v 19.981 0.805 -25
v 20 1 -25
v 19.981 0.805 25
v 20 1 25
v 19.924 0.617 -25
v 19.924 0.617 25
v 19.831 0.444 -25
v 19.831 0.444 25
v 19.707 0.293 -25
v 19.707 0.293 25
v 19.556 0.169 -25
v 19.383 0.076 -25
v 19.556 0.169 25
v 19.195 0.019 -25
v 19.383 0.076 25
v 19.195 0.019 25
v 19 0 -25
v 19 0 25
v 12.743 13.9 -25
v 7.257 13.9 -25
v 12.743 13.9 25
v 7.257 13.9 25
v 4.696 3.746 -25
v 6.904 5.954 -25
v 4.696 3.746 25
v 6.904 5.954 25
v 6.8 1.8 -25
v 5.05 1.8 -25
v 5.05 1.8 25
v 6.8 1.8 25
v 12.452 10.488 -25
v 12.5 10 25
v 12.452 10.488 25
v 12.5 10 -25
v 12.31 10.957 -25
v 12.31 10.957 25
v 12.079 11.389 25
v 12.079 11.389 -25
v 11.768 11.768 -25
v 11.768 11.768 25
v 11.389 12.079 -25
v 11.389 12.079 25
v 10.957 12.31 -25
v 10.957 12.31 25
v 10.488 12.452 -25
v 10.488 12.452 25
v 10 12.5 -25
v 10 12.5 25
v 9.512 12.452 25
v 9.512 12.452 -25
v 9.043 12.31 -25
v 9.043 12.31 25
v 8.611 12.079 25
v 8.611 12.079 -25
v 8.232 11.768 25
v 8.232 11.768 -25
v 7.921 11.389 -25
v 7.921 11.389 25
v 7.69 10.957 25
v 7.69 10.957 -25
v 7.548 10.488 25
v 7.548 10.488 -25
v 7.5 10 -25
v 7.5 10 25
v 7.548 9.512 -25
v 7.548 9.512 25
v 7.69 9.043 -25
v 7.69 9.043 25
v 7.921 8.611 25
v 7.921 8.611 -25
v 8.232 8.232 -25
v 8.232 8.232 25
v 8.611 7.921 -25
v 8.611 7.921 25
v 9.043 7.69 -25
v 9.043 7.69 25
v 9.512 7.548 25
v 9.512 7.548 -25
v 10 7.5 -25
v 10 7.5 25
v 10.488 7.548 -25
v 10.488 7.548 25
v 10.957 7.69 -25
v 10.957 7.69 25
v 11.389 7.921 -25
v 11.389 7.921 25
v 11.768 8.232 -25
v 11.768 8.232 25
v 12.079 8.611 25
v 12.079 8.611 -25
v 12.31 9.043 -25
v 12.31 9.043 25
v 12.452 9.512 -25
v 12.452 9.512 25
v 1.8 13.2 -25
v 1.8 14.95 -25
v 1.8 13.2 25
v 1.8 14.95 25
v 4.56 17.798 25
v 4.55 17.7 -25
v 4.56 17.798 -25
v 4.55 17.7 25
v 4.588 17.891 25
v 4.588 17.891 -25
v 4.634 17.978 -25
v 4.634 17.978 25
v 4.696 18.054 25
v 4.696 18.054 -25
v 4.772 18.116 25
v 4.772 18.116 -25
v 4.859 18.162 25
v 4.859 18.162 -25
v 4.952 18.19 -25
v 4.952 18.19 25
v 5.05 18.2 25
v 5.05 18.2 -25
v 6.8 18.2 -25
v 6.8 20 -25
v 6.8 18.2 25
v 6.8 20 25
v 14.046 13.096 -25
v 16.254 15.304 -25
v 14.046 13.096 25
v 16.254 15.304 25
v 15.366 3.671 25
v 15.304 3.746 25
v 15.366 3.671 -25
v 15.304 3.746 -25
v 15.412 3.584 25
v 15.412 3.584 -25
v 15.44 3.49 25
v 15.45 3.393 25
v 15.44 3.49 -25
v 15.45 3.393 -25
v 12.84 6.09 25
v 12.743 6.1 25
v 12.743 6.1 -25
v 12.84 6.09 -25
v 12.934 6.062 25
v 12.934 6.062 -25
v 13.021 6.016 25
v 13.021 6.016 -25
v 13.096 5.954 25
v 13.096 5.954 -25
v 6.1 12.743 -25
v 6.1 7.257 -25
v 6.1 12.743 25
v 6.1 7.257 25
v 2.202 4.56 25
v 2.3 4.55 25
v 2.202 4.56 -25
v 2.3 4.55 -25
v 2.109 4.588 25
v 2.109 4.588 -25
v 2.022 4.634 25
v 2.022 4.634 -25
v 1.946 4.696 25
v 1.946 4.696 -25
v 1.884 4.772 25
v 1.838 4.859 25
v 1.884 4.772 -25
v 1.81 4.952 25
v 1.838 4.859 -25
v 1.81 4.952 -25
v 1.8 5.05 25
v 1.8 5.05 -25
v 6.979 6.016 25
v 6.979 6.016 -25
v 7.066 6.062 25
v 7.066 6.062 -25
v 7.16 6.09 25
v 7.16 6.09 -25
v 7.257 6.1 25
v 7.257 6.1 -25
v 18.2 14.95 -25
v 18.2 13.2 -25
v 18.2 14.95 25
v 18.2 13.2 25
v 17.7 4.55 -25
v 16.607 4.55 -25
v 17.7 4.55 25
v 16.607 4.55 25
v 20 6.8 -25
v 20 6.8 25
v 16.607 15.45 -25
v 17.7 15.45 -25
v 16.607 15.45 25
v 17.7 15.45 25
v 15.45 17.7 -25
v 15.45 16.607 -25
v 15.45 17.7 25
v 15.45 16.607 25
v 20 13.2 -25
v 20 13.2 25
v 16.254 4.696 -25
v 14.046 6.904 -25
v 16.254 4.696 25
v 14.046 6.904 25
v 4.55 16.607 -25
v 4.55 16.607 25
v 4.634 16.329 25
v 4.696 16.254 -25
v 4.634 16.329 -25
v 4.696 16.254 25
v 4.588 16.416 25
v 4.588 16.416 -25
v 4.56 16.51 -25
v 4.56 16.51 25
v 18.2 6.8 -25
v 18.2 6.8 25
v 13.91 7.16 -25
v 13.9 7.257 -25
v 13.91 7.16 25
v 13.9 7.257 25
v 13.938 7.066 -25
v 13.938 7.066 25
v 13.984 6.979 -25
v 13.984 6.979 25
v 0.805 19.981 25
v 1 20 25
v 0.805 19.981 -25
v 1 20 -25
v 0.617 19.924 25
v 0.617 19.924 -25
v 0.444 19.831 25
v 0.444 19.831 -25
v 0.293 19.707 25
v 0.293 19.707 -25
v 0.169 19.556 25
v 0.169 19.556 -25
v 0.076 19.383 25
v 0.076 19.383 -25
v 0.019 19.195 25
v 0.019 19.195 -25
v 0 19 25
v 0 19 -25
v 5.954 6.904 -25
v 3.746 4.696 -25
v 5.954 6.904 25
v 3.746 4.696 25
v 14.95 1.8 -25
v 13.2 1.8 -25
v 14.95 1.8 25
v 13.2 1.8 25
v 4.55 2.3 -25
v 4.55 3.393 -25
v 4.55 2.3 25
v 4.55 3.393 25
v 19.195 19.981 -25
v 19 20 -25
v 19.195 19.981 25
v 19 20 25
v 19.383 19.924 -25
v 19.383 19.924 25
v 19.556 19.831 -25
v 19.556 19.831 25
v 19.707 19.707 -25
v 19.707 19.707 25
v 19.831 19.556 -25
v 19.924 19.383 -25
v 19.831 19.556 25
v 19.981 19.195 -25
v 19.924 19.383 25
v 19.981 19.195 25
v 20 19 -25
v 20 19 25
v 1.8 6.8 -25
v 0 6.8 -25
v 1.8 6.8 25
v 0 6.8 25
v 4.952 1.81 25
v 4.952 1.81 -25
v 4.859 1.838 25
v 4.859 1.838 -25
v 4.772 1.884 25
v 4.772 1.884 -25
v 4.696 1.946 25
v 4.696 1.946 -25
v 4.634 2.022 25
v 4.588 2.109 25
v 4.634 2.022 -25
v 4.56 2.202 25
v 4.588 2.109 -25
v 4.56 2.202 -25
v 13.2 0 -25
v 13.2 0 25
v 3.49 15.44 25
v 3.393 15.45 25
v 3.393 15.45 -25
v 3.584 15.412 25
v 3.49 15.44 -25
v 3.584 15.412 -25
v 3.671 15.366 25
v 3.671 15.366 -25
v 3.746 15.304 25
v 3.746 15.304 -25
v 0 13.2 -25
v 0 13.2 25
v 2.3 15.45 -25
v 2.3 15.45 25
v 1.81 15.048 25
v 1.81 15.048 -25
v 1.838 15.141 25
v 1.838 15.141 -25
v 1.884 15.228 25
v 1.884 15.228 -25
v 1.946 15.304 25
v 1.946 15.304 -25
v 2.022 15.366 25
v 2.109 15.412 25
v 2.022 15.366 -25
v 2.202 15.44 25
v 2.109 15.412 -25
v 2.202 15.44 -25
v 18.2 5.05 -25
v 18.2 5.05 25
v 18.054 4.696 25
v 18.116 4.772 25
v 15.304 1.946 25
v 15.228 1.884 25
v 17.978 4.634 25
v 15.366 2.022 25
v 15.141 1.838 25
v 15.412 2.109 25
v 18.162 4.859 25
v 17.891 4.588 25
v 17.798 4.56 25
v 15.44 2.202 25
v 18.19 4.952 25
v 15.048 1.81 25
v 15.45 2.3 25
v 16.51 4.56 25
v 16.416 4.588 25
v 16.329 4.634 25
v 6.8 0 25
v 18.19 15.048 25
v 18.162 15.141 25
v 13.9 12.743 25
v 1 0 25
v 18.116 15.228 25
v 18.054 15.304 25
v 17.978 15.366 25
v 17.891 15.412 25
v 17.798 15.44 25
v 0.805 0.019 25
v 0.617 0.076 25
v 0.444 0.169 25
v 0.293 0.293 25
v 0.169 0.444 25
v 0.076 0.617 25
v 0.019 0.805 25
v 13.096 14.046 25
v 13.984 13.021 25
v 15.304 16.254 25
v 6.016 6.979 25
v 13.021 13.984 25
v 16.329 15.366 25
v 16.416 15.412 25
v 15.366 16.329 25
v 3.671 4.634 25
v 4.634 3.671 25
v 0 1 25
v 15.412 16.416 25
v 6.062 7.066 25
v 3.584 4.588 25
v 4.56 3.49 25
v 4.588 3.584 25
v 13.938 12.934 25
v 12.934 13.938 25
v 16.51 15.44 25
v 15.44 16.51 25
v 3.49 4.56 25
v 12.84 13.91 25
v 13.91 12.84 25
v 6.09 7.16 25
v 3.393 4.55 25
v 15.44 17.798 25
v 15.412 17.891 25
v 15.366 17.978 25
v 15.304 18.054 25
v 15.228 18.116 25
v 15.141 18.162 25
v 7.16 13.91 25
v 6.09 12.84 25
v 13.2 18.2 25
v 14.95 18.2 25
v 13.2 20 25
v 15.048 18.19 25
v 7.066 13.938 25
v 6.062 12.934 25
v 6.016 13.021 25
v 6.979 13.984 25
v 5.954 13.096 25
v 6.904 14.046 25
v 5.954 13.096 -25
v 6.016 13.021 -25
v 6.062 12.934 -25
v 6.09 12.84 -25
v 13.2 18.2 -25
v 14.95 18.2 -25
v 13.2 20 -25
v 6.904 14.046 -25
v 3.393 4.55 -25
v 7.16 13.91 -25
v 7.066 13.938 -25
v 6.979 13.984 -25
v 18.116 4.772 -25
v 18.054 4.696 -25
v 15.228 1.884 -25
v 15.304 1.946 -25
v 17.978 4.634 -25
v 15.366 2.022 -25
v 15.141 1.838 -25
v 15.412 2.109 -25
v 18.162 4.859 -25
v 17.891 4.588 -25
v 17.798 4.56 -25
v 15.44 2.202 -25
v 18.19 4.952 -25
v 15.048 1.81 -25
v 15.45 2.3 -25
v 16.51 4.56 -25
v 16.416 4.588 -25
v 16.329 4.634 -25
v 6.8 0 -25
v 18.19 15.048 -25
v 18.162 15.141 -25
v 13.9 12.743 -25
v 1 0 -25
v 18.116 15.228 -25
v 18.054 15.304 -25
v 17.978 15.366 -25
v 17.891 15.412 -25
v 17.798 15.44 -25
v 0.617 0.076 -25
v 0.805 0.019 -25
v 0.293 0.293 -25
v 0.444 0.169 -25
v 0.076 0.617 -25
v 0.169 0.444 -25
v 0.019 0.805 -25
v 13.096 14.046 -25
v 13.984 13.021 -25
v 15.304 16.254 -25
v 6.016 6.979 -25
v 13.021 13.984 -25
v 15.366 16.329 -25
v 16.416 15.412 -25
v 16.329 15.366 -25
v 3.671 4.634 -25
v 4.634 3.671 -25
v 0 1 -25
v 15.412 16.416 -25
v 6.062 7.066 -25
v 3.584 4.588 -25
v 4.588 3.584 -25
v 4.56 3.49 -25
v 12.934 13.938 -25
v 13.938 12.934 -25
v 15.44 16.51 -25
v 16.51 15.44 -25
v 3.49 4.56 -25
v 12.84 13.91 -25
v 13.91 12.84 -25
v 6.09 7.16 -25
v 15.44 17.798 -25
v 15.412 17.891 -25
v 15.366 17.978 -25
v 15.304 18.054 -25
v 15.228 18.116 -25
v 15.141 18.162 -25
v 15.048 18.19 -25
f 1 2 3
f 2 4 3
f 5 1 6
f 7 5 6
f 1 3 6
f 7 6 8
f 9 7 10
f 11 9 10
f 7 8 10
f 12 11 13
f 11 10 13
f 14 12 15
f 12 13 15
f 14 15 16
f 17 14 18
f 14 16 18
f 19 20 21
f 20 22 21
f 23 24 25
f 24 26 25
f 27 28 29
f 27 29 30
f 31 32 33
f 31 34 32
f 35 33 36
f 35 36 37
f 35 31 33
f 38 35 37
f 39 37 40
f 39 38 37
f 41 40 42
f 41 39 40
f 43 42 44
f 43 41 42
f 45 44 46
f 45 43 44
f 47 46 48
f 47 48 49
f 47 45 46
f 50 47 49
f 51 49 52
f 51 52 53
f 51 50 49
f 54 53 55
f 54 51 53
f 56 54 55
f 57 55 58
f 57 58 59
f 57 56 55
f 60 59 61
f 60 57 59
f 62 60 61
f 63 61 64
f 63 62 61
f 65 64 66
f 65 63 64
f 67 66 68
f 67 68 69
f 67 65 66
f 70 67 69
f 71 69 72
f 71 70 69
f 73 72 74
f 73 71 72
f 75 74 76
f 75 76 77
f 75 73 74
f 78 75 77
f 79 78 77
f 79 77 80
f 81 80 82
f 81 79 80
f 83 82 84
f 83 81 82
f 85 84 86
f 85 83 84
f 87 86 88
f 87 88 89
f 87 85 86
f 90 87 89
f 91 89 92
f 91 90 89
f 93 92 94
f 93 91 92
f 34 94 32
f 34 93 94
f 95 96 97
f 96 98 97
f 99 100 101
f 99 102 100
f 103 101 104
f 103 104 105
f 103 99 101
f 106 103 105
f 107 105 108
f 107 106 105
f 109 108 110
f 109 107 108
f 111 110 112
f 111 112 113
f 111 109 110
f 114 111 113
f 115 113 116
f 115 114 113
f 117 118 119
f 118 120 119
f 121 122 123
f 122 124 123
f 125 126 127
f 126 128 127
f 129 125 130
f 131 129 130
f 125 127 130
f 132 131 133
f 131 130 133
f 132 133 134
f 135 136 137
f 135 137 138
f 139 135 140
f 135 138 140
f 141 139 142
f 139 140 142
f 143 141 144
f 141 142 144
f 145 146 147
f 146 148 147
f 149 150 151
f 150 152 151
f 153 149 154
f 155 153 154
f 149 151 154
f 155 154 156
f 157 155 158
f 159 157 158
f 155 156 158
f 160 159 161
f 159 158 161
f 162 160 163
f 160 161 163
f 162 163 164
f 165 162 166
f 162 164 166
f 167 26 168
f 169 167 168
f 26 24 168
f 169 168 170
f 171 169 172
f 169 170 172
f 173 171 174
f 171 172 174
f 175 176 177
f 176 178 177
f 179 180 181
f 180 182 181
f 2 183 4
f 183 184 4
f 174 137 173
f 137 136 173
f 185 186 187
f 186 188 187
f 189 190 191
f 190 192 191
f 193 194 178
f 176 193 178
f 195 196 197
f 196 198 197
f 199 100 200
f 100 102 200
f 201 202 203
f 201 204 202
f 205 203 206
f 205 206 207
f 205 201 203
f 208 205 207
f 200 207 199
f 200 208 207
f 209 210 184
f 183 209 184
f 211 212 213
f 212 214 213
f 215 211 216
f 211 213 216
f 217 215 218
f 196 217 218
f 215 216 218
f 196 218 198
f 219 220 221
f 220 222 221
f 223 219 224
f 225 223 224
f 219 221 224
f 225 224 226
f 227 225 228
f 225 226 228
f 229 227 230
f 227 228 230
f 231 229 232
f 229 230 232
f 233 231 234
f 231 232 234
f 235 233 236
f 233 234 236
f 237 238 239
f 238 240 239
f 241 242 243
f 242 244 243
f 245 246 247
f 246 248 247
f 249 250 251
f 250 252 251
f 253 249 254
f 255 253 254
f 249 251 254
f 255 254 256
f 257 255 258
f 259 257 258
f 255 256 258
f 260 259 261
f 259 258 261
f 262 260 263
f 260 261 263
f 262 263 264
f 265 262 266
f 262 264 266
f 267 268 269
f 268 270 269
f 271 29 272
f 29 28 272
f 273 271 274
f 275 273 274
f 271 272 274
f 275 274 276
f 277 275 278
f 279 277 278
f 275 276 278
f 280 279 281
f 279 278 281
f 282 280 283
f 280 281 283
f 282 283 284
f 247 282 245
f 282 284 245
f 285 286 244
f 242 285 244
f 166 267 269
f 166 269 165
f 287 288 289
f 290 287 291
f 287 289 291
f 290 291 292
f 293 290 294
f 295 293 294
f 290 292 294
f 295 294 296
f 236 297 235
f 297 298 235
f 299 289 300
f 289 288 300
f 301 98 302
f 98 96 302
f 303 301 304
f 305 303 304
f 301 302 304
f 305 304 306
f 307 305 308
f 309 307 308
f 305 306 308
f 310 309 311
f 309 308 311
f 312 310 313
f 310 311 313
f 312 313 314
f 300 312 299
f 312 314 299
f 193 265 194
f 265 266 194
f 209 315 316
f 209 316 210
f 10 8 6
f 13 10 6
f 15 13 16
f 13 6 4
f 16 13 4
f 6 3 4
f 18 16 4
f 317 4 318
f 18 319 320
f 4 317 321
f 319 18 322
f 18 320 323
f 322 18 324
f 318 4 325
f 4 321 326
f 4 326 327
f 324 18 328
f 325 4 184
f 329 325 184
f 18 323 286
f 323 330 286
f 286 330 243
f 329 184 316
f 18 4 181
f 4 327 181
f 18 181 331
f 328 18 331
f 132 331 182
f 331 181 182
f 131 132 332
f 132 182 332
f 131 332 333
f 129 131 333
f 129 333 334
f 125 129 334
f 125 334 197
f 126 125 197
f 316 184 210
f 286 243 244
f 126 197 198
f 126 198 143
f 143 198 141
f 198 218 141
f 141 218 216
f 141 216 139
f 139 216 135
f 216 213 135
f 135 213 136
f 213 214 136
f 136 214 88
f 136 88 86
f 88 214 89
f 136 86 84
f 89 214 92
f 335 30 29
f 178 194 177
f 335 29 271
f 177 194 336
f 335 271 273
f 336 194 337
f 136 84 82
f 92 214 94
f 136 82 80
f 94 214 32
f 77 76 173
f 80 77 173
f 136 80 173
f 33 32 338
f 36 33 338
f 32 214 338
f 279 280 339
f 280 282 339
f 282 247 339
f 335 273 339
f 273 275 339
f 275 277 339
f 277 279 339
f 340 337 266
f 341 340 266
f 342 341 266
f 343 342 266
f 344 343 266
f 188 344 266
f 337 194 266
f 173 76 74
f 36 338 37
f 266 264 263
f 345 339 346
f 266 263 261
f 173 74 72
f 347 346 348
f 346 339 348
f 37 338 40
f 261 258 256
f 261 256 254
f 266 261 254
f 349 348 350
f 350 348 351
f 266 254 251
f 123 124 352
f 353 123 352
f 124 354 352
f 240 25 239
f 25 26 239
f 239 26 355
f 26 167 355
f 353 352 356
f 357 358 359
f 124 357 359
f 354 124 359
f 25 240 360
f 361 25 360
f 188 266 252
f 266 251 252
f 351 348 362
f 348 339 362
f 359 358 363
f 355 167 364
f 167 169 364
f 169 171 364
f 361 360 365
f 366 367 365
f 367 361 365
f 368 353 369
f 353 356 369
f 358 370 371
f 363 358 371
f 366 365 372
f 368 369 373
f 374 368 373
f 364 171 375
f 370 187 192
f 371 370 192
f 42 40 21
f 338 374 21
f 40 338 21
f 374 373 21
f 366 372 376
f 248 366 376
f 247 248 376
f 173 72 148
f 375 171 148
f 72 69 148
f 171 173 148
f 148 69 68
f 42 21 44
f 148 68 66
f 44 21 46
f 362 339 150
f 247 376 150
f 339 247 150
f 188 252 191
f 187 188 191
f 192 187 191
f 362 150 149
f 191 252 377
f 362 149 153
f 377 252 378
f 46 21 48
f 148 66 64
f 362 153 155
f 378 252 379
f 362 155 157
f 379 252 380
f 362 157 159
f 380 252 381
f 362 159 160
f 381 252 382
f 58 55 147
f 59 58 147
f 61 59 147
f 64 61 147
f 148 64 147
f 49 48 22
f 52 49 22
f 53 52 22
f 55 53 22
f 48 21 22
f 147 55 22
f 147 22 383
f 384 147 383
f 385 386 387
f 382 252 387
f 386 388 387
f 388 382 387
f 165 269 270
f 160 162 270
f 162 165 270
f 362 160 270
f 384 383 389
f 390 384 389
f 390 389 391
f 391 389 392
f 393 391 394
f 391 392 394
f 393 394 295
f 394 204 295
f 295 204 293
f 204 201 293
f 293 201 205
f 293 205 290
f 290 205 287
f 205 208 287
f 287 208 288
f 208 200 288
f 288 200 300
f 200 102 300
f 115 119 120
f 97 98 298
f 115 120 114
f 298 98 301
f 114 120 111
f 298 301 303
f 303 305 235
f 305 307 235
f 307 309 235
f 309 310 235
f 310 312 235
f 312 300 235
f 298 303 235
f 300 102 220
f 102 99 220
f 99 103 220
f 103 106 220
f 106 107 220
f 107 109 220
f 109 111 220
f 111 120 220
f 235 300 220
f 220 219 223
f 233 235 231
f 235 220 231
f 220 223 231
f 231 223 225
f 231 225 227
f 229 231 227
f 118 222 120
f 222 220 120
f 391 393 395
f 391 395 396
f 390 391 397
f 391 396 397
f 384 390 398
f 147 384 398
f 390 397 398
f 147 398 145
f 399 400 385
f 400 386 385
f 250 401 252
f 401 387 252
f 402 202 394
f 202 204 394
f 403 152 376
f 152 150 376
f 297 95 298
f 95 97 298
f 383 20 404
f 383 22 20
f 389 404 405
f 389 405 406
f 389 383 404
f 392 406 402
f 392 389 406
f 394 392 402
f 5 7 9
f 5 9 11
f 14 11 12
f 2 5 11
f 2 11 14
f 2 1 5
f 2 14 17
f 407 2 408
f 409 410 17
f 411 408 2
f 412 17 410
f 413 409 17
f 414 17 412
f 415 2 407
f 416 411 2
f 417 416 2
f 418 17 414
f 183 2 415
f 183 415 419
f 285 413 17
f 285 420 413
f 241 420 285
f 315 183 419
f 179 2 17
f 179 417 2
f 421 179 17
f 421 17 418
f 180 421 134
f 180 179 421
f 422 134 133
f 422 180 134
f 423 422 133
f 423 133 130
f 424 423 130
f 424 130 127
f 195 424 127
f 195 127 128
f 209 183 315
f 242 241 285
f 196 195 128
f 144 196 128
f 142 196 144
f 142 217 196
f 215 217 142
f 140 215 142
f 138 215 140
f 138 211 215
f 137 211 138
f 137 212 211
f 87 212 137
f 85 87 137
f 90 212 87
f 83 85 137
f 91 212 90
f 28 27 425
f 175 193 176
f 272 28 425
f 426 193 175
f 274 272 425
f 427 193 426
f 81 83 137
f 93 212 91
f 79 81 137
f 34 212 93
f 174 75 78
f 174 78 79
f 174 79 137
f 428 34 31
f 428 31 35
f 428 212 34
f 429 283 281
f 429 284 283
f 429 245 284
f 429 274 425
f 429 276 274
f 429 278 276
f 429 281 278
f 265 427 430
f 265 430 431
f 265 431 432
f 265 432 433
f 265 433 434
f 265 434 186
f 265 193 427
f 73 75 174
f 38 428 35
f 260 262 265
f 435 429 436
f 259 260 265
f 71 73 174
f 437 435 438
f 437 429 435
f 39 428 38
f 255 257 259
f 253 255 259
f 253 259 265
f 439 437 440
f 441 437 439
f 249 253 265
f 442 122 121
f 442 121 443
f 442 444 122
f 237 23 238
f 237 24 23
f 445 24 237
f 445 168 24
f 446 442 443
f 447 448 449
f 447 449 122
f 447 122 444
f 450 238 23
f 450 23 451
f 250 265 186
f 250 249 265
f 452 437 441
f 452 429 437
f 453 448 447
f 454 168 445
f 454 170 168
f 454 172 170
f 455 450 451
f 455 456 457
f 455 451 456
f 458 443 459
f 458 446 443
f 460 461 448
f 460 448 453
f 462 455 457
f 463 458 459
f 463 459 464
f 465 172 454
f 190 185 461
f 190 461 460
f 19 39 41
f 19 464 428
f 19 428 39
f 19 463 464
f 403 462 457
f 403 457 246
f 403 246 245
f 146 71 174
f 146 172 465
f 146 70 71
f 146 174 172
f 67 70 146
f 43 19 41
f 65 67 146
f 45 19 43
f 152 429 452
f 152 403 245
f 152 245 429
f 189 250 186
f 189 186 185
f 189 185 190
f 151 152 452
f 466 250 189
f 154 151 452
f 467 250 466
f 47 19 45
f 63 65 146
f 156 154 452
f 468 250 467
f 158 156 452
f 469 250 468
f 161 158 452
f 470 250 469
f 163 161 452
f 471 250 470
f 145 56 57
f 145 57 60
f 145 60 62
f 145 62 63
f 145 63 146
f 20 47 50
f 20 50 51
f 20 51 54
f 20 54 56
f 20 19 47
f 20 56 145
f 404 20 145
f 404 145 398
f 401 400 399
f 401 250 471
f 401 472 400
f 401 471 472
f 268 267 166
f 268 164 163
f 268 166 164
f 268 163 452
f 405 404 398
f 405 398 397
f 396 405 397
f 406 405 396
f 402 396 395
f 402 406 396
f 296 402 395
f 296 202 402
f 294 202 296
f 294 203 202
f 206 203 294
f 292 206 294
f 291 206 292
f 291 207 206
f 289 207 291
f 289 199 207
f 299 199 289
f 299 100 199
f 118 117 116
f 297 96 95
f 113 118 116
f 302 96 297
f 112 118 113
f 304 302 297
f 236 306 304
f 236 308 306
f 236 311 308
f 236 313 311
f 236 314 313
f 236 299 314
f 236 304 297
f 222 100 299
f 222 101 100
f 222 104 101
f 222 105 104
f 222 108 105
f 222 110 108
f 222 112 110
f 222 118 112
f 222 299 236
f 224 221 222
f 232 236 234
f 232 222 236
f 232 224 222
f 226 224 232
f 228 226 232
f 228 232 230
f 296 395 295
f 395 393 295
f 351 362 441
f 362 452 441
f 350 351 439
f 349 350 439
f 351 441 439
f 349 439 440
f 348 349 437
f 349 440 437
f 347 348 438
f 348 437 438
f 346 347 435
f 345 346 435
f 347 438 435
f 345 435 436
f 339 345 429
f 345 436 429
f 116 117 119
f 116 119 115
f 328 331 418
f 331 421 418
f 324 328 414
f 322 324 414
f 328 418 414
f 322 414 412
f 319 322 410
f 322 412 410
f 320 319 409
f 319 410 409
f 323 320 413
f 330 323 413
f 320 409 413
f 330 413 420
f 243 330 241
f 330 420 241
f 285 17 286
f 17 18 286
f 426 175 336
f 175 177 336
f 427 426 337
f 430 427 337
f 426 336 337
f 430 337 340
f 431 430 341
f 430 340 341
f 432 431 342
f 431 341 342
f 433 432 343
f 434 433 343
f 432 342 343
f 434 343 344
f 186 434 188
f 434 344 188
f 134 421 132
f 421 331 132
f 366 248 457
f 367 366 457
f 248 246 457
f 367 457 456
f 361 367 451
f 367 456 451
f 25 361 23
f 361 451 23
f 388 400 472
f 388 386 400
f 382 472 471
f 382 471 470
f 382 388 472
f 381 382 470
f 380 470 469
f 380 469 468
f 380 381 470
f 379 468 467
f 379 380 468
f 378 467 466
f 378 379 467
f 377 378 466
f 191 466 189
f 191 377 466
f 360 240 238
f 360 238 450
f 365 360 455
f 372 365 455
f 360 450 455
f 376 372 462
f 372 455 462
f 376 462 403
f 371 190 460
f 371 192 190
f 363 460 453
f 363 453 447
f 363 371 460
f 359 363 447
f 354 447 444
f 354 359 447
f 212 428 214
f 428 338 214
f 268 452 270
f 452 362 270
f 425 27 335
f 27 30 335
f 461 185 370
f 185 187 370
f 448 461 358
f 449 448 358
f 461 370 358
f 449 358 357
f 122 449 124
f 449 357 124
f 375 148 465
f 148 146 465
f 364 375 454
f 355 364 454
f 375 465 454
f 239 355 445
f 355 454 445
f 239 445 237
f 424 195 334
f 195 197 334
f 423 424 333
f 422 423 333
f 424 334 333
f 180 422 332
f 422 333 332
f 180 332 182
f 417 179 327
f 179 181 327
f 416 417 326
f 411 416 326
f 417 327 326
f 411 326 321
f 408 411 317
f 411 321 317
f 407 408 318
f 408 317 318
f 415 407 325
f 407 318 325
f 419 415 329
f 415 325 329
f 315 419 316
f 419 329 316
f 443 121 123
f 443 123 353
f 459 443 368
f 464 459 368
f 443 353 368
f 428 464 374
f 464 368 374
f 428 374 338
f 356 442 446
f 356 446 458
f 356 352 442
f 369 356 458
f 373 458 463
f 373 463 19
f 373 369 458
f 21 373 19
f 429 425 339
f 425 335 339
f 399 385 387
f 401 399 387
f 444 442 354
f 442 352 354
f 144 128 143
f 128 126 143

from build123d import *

# Parameters (mm, degrees)
SKETCH1_R           = 2.5
BOSS_EXTRUDE1_DEPTH = 25
FILLET1_R           = 1
FILLET2_R           = 0.5
FILLET3_R           = 0.5
FILLET4_R           = 0.5
FILLET5_R           = 0.5


with BuildPart() as part:
    # Sketch1 → Boss-Extrude1 (new, symmetric)
    with BuildSketch(Plane.XY):
        Polygon((13.2, 0), (13.2, 1.8), (15.45, 1.8), (15.45, 3.6), (12.95, 6.1), (7.05, 6.1), (4.55, 3.6), (4.55, 1.8), (6.8, 1.8), (6.8, 0), (0, 0), (0, 6.8), (1.8, 6.8), (1.8, 4.55), (3.6, 4.55), (6.1, 7.05), (6.1, 12.95), (3.6, 15.45), (1.8, 15.45), (1.8, 13.2), (0, 13.2), (0, 20), (6.8, 20), (6.8, 18.2), (4.55, 18.2), (4.55, 16.4), (7.05, 13.9), (12.95, 13.9), (15.45, 16.4), (15.45, 18.2), (13.2, 18.2), (13.2, 20), (20, 20), (20, 13.2), (18.2, 13.2), (18.2, 15.45), (16.4, 15.45), (13.9, 12.95), (13.9, 7.05), (16.4, 4.55), (18.2, 4.55), (18.2, 6.8), (20, 6.8), (20, 0), align=None)
        with Locations((10, 10)):
            Circle(SKETCH1_R, mode=Mode.SUBTRACT)
    extrude(amount=BOSS_EXTRUDE1_DEPTH, both=True)

    # Fillet1
    fillet1_edges = [part.edges().sort_by_distance(p)[0] for p in [
        (0, 0, 0),
        (0, 20, 0),
        (20, 20, 0),
        (20, 0, 0),
    ]]
    fillet(fillet1_edges, radius=FILLET1_R)

    # Fillet2
    fillet2_edges = [part.edges().sort_by_distance(p)[0] for p in [
        (4.55, 18.2, 0),
        (4.55, 16.4, 0),
        (7.05, 13.9, 0),
        (12.95, 13.9, 0),
        (15.45, 16.4, 0),
        (15.45, 18.2, 0),
    ]]
    fillet(fillet2_edges, radius=FILLET2_R)

    # Fillet3
    fillet3_edges = [part.edges().sort_by_distance(p)[0] for p in [
        (18.2, 15.45, 0),
        (16.4, 15.45, 0),
        (13.9, 12.95, 0),
        (13.9, 7.05, 0),
        (16.4, 4.55, 0),
        (18.2, 4.55, 0),
    ]]
    fillet(fillet3_edges, radius=FILLET3_R)

    # Fillet4
    fillet4_edges = [part.edges().sort_by_distance(p)[0] for p in [
        (1.8, 4.55, 0),
        (3.6, 4.55, 0),
        (6.1, 7.05, 0),
        (6.1, 12.95, 0),
        (3.6, 15.45, 0),
        (1.8, 15.45, 0),
    ]]
    fillet(fillet4_edges, radius=FILLET4_R)

    # Fillet5
    fillet5_edges = [part.edges().sort_by_distance(p)[0] for p in [
        (15.45, 1.8, 0),
        (15.45, 3.6, 0),
        (12.95, 6.1, 0),
        (7.05, 6.1, 0),
        (4.55, 3.6, 0),
        (4.55, 1.8, 0),
    ]]
    fillet(fillet5_edges, radius=FILLET5_R)


solid = part.part
